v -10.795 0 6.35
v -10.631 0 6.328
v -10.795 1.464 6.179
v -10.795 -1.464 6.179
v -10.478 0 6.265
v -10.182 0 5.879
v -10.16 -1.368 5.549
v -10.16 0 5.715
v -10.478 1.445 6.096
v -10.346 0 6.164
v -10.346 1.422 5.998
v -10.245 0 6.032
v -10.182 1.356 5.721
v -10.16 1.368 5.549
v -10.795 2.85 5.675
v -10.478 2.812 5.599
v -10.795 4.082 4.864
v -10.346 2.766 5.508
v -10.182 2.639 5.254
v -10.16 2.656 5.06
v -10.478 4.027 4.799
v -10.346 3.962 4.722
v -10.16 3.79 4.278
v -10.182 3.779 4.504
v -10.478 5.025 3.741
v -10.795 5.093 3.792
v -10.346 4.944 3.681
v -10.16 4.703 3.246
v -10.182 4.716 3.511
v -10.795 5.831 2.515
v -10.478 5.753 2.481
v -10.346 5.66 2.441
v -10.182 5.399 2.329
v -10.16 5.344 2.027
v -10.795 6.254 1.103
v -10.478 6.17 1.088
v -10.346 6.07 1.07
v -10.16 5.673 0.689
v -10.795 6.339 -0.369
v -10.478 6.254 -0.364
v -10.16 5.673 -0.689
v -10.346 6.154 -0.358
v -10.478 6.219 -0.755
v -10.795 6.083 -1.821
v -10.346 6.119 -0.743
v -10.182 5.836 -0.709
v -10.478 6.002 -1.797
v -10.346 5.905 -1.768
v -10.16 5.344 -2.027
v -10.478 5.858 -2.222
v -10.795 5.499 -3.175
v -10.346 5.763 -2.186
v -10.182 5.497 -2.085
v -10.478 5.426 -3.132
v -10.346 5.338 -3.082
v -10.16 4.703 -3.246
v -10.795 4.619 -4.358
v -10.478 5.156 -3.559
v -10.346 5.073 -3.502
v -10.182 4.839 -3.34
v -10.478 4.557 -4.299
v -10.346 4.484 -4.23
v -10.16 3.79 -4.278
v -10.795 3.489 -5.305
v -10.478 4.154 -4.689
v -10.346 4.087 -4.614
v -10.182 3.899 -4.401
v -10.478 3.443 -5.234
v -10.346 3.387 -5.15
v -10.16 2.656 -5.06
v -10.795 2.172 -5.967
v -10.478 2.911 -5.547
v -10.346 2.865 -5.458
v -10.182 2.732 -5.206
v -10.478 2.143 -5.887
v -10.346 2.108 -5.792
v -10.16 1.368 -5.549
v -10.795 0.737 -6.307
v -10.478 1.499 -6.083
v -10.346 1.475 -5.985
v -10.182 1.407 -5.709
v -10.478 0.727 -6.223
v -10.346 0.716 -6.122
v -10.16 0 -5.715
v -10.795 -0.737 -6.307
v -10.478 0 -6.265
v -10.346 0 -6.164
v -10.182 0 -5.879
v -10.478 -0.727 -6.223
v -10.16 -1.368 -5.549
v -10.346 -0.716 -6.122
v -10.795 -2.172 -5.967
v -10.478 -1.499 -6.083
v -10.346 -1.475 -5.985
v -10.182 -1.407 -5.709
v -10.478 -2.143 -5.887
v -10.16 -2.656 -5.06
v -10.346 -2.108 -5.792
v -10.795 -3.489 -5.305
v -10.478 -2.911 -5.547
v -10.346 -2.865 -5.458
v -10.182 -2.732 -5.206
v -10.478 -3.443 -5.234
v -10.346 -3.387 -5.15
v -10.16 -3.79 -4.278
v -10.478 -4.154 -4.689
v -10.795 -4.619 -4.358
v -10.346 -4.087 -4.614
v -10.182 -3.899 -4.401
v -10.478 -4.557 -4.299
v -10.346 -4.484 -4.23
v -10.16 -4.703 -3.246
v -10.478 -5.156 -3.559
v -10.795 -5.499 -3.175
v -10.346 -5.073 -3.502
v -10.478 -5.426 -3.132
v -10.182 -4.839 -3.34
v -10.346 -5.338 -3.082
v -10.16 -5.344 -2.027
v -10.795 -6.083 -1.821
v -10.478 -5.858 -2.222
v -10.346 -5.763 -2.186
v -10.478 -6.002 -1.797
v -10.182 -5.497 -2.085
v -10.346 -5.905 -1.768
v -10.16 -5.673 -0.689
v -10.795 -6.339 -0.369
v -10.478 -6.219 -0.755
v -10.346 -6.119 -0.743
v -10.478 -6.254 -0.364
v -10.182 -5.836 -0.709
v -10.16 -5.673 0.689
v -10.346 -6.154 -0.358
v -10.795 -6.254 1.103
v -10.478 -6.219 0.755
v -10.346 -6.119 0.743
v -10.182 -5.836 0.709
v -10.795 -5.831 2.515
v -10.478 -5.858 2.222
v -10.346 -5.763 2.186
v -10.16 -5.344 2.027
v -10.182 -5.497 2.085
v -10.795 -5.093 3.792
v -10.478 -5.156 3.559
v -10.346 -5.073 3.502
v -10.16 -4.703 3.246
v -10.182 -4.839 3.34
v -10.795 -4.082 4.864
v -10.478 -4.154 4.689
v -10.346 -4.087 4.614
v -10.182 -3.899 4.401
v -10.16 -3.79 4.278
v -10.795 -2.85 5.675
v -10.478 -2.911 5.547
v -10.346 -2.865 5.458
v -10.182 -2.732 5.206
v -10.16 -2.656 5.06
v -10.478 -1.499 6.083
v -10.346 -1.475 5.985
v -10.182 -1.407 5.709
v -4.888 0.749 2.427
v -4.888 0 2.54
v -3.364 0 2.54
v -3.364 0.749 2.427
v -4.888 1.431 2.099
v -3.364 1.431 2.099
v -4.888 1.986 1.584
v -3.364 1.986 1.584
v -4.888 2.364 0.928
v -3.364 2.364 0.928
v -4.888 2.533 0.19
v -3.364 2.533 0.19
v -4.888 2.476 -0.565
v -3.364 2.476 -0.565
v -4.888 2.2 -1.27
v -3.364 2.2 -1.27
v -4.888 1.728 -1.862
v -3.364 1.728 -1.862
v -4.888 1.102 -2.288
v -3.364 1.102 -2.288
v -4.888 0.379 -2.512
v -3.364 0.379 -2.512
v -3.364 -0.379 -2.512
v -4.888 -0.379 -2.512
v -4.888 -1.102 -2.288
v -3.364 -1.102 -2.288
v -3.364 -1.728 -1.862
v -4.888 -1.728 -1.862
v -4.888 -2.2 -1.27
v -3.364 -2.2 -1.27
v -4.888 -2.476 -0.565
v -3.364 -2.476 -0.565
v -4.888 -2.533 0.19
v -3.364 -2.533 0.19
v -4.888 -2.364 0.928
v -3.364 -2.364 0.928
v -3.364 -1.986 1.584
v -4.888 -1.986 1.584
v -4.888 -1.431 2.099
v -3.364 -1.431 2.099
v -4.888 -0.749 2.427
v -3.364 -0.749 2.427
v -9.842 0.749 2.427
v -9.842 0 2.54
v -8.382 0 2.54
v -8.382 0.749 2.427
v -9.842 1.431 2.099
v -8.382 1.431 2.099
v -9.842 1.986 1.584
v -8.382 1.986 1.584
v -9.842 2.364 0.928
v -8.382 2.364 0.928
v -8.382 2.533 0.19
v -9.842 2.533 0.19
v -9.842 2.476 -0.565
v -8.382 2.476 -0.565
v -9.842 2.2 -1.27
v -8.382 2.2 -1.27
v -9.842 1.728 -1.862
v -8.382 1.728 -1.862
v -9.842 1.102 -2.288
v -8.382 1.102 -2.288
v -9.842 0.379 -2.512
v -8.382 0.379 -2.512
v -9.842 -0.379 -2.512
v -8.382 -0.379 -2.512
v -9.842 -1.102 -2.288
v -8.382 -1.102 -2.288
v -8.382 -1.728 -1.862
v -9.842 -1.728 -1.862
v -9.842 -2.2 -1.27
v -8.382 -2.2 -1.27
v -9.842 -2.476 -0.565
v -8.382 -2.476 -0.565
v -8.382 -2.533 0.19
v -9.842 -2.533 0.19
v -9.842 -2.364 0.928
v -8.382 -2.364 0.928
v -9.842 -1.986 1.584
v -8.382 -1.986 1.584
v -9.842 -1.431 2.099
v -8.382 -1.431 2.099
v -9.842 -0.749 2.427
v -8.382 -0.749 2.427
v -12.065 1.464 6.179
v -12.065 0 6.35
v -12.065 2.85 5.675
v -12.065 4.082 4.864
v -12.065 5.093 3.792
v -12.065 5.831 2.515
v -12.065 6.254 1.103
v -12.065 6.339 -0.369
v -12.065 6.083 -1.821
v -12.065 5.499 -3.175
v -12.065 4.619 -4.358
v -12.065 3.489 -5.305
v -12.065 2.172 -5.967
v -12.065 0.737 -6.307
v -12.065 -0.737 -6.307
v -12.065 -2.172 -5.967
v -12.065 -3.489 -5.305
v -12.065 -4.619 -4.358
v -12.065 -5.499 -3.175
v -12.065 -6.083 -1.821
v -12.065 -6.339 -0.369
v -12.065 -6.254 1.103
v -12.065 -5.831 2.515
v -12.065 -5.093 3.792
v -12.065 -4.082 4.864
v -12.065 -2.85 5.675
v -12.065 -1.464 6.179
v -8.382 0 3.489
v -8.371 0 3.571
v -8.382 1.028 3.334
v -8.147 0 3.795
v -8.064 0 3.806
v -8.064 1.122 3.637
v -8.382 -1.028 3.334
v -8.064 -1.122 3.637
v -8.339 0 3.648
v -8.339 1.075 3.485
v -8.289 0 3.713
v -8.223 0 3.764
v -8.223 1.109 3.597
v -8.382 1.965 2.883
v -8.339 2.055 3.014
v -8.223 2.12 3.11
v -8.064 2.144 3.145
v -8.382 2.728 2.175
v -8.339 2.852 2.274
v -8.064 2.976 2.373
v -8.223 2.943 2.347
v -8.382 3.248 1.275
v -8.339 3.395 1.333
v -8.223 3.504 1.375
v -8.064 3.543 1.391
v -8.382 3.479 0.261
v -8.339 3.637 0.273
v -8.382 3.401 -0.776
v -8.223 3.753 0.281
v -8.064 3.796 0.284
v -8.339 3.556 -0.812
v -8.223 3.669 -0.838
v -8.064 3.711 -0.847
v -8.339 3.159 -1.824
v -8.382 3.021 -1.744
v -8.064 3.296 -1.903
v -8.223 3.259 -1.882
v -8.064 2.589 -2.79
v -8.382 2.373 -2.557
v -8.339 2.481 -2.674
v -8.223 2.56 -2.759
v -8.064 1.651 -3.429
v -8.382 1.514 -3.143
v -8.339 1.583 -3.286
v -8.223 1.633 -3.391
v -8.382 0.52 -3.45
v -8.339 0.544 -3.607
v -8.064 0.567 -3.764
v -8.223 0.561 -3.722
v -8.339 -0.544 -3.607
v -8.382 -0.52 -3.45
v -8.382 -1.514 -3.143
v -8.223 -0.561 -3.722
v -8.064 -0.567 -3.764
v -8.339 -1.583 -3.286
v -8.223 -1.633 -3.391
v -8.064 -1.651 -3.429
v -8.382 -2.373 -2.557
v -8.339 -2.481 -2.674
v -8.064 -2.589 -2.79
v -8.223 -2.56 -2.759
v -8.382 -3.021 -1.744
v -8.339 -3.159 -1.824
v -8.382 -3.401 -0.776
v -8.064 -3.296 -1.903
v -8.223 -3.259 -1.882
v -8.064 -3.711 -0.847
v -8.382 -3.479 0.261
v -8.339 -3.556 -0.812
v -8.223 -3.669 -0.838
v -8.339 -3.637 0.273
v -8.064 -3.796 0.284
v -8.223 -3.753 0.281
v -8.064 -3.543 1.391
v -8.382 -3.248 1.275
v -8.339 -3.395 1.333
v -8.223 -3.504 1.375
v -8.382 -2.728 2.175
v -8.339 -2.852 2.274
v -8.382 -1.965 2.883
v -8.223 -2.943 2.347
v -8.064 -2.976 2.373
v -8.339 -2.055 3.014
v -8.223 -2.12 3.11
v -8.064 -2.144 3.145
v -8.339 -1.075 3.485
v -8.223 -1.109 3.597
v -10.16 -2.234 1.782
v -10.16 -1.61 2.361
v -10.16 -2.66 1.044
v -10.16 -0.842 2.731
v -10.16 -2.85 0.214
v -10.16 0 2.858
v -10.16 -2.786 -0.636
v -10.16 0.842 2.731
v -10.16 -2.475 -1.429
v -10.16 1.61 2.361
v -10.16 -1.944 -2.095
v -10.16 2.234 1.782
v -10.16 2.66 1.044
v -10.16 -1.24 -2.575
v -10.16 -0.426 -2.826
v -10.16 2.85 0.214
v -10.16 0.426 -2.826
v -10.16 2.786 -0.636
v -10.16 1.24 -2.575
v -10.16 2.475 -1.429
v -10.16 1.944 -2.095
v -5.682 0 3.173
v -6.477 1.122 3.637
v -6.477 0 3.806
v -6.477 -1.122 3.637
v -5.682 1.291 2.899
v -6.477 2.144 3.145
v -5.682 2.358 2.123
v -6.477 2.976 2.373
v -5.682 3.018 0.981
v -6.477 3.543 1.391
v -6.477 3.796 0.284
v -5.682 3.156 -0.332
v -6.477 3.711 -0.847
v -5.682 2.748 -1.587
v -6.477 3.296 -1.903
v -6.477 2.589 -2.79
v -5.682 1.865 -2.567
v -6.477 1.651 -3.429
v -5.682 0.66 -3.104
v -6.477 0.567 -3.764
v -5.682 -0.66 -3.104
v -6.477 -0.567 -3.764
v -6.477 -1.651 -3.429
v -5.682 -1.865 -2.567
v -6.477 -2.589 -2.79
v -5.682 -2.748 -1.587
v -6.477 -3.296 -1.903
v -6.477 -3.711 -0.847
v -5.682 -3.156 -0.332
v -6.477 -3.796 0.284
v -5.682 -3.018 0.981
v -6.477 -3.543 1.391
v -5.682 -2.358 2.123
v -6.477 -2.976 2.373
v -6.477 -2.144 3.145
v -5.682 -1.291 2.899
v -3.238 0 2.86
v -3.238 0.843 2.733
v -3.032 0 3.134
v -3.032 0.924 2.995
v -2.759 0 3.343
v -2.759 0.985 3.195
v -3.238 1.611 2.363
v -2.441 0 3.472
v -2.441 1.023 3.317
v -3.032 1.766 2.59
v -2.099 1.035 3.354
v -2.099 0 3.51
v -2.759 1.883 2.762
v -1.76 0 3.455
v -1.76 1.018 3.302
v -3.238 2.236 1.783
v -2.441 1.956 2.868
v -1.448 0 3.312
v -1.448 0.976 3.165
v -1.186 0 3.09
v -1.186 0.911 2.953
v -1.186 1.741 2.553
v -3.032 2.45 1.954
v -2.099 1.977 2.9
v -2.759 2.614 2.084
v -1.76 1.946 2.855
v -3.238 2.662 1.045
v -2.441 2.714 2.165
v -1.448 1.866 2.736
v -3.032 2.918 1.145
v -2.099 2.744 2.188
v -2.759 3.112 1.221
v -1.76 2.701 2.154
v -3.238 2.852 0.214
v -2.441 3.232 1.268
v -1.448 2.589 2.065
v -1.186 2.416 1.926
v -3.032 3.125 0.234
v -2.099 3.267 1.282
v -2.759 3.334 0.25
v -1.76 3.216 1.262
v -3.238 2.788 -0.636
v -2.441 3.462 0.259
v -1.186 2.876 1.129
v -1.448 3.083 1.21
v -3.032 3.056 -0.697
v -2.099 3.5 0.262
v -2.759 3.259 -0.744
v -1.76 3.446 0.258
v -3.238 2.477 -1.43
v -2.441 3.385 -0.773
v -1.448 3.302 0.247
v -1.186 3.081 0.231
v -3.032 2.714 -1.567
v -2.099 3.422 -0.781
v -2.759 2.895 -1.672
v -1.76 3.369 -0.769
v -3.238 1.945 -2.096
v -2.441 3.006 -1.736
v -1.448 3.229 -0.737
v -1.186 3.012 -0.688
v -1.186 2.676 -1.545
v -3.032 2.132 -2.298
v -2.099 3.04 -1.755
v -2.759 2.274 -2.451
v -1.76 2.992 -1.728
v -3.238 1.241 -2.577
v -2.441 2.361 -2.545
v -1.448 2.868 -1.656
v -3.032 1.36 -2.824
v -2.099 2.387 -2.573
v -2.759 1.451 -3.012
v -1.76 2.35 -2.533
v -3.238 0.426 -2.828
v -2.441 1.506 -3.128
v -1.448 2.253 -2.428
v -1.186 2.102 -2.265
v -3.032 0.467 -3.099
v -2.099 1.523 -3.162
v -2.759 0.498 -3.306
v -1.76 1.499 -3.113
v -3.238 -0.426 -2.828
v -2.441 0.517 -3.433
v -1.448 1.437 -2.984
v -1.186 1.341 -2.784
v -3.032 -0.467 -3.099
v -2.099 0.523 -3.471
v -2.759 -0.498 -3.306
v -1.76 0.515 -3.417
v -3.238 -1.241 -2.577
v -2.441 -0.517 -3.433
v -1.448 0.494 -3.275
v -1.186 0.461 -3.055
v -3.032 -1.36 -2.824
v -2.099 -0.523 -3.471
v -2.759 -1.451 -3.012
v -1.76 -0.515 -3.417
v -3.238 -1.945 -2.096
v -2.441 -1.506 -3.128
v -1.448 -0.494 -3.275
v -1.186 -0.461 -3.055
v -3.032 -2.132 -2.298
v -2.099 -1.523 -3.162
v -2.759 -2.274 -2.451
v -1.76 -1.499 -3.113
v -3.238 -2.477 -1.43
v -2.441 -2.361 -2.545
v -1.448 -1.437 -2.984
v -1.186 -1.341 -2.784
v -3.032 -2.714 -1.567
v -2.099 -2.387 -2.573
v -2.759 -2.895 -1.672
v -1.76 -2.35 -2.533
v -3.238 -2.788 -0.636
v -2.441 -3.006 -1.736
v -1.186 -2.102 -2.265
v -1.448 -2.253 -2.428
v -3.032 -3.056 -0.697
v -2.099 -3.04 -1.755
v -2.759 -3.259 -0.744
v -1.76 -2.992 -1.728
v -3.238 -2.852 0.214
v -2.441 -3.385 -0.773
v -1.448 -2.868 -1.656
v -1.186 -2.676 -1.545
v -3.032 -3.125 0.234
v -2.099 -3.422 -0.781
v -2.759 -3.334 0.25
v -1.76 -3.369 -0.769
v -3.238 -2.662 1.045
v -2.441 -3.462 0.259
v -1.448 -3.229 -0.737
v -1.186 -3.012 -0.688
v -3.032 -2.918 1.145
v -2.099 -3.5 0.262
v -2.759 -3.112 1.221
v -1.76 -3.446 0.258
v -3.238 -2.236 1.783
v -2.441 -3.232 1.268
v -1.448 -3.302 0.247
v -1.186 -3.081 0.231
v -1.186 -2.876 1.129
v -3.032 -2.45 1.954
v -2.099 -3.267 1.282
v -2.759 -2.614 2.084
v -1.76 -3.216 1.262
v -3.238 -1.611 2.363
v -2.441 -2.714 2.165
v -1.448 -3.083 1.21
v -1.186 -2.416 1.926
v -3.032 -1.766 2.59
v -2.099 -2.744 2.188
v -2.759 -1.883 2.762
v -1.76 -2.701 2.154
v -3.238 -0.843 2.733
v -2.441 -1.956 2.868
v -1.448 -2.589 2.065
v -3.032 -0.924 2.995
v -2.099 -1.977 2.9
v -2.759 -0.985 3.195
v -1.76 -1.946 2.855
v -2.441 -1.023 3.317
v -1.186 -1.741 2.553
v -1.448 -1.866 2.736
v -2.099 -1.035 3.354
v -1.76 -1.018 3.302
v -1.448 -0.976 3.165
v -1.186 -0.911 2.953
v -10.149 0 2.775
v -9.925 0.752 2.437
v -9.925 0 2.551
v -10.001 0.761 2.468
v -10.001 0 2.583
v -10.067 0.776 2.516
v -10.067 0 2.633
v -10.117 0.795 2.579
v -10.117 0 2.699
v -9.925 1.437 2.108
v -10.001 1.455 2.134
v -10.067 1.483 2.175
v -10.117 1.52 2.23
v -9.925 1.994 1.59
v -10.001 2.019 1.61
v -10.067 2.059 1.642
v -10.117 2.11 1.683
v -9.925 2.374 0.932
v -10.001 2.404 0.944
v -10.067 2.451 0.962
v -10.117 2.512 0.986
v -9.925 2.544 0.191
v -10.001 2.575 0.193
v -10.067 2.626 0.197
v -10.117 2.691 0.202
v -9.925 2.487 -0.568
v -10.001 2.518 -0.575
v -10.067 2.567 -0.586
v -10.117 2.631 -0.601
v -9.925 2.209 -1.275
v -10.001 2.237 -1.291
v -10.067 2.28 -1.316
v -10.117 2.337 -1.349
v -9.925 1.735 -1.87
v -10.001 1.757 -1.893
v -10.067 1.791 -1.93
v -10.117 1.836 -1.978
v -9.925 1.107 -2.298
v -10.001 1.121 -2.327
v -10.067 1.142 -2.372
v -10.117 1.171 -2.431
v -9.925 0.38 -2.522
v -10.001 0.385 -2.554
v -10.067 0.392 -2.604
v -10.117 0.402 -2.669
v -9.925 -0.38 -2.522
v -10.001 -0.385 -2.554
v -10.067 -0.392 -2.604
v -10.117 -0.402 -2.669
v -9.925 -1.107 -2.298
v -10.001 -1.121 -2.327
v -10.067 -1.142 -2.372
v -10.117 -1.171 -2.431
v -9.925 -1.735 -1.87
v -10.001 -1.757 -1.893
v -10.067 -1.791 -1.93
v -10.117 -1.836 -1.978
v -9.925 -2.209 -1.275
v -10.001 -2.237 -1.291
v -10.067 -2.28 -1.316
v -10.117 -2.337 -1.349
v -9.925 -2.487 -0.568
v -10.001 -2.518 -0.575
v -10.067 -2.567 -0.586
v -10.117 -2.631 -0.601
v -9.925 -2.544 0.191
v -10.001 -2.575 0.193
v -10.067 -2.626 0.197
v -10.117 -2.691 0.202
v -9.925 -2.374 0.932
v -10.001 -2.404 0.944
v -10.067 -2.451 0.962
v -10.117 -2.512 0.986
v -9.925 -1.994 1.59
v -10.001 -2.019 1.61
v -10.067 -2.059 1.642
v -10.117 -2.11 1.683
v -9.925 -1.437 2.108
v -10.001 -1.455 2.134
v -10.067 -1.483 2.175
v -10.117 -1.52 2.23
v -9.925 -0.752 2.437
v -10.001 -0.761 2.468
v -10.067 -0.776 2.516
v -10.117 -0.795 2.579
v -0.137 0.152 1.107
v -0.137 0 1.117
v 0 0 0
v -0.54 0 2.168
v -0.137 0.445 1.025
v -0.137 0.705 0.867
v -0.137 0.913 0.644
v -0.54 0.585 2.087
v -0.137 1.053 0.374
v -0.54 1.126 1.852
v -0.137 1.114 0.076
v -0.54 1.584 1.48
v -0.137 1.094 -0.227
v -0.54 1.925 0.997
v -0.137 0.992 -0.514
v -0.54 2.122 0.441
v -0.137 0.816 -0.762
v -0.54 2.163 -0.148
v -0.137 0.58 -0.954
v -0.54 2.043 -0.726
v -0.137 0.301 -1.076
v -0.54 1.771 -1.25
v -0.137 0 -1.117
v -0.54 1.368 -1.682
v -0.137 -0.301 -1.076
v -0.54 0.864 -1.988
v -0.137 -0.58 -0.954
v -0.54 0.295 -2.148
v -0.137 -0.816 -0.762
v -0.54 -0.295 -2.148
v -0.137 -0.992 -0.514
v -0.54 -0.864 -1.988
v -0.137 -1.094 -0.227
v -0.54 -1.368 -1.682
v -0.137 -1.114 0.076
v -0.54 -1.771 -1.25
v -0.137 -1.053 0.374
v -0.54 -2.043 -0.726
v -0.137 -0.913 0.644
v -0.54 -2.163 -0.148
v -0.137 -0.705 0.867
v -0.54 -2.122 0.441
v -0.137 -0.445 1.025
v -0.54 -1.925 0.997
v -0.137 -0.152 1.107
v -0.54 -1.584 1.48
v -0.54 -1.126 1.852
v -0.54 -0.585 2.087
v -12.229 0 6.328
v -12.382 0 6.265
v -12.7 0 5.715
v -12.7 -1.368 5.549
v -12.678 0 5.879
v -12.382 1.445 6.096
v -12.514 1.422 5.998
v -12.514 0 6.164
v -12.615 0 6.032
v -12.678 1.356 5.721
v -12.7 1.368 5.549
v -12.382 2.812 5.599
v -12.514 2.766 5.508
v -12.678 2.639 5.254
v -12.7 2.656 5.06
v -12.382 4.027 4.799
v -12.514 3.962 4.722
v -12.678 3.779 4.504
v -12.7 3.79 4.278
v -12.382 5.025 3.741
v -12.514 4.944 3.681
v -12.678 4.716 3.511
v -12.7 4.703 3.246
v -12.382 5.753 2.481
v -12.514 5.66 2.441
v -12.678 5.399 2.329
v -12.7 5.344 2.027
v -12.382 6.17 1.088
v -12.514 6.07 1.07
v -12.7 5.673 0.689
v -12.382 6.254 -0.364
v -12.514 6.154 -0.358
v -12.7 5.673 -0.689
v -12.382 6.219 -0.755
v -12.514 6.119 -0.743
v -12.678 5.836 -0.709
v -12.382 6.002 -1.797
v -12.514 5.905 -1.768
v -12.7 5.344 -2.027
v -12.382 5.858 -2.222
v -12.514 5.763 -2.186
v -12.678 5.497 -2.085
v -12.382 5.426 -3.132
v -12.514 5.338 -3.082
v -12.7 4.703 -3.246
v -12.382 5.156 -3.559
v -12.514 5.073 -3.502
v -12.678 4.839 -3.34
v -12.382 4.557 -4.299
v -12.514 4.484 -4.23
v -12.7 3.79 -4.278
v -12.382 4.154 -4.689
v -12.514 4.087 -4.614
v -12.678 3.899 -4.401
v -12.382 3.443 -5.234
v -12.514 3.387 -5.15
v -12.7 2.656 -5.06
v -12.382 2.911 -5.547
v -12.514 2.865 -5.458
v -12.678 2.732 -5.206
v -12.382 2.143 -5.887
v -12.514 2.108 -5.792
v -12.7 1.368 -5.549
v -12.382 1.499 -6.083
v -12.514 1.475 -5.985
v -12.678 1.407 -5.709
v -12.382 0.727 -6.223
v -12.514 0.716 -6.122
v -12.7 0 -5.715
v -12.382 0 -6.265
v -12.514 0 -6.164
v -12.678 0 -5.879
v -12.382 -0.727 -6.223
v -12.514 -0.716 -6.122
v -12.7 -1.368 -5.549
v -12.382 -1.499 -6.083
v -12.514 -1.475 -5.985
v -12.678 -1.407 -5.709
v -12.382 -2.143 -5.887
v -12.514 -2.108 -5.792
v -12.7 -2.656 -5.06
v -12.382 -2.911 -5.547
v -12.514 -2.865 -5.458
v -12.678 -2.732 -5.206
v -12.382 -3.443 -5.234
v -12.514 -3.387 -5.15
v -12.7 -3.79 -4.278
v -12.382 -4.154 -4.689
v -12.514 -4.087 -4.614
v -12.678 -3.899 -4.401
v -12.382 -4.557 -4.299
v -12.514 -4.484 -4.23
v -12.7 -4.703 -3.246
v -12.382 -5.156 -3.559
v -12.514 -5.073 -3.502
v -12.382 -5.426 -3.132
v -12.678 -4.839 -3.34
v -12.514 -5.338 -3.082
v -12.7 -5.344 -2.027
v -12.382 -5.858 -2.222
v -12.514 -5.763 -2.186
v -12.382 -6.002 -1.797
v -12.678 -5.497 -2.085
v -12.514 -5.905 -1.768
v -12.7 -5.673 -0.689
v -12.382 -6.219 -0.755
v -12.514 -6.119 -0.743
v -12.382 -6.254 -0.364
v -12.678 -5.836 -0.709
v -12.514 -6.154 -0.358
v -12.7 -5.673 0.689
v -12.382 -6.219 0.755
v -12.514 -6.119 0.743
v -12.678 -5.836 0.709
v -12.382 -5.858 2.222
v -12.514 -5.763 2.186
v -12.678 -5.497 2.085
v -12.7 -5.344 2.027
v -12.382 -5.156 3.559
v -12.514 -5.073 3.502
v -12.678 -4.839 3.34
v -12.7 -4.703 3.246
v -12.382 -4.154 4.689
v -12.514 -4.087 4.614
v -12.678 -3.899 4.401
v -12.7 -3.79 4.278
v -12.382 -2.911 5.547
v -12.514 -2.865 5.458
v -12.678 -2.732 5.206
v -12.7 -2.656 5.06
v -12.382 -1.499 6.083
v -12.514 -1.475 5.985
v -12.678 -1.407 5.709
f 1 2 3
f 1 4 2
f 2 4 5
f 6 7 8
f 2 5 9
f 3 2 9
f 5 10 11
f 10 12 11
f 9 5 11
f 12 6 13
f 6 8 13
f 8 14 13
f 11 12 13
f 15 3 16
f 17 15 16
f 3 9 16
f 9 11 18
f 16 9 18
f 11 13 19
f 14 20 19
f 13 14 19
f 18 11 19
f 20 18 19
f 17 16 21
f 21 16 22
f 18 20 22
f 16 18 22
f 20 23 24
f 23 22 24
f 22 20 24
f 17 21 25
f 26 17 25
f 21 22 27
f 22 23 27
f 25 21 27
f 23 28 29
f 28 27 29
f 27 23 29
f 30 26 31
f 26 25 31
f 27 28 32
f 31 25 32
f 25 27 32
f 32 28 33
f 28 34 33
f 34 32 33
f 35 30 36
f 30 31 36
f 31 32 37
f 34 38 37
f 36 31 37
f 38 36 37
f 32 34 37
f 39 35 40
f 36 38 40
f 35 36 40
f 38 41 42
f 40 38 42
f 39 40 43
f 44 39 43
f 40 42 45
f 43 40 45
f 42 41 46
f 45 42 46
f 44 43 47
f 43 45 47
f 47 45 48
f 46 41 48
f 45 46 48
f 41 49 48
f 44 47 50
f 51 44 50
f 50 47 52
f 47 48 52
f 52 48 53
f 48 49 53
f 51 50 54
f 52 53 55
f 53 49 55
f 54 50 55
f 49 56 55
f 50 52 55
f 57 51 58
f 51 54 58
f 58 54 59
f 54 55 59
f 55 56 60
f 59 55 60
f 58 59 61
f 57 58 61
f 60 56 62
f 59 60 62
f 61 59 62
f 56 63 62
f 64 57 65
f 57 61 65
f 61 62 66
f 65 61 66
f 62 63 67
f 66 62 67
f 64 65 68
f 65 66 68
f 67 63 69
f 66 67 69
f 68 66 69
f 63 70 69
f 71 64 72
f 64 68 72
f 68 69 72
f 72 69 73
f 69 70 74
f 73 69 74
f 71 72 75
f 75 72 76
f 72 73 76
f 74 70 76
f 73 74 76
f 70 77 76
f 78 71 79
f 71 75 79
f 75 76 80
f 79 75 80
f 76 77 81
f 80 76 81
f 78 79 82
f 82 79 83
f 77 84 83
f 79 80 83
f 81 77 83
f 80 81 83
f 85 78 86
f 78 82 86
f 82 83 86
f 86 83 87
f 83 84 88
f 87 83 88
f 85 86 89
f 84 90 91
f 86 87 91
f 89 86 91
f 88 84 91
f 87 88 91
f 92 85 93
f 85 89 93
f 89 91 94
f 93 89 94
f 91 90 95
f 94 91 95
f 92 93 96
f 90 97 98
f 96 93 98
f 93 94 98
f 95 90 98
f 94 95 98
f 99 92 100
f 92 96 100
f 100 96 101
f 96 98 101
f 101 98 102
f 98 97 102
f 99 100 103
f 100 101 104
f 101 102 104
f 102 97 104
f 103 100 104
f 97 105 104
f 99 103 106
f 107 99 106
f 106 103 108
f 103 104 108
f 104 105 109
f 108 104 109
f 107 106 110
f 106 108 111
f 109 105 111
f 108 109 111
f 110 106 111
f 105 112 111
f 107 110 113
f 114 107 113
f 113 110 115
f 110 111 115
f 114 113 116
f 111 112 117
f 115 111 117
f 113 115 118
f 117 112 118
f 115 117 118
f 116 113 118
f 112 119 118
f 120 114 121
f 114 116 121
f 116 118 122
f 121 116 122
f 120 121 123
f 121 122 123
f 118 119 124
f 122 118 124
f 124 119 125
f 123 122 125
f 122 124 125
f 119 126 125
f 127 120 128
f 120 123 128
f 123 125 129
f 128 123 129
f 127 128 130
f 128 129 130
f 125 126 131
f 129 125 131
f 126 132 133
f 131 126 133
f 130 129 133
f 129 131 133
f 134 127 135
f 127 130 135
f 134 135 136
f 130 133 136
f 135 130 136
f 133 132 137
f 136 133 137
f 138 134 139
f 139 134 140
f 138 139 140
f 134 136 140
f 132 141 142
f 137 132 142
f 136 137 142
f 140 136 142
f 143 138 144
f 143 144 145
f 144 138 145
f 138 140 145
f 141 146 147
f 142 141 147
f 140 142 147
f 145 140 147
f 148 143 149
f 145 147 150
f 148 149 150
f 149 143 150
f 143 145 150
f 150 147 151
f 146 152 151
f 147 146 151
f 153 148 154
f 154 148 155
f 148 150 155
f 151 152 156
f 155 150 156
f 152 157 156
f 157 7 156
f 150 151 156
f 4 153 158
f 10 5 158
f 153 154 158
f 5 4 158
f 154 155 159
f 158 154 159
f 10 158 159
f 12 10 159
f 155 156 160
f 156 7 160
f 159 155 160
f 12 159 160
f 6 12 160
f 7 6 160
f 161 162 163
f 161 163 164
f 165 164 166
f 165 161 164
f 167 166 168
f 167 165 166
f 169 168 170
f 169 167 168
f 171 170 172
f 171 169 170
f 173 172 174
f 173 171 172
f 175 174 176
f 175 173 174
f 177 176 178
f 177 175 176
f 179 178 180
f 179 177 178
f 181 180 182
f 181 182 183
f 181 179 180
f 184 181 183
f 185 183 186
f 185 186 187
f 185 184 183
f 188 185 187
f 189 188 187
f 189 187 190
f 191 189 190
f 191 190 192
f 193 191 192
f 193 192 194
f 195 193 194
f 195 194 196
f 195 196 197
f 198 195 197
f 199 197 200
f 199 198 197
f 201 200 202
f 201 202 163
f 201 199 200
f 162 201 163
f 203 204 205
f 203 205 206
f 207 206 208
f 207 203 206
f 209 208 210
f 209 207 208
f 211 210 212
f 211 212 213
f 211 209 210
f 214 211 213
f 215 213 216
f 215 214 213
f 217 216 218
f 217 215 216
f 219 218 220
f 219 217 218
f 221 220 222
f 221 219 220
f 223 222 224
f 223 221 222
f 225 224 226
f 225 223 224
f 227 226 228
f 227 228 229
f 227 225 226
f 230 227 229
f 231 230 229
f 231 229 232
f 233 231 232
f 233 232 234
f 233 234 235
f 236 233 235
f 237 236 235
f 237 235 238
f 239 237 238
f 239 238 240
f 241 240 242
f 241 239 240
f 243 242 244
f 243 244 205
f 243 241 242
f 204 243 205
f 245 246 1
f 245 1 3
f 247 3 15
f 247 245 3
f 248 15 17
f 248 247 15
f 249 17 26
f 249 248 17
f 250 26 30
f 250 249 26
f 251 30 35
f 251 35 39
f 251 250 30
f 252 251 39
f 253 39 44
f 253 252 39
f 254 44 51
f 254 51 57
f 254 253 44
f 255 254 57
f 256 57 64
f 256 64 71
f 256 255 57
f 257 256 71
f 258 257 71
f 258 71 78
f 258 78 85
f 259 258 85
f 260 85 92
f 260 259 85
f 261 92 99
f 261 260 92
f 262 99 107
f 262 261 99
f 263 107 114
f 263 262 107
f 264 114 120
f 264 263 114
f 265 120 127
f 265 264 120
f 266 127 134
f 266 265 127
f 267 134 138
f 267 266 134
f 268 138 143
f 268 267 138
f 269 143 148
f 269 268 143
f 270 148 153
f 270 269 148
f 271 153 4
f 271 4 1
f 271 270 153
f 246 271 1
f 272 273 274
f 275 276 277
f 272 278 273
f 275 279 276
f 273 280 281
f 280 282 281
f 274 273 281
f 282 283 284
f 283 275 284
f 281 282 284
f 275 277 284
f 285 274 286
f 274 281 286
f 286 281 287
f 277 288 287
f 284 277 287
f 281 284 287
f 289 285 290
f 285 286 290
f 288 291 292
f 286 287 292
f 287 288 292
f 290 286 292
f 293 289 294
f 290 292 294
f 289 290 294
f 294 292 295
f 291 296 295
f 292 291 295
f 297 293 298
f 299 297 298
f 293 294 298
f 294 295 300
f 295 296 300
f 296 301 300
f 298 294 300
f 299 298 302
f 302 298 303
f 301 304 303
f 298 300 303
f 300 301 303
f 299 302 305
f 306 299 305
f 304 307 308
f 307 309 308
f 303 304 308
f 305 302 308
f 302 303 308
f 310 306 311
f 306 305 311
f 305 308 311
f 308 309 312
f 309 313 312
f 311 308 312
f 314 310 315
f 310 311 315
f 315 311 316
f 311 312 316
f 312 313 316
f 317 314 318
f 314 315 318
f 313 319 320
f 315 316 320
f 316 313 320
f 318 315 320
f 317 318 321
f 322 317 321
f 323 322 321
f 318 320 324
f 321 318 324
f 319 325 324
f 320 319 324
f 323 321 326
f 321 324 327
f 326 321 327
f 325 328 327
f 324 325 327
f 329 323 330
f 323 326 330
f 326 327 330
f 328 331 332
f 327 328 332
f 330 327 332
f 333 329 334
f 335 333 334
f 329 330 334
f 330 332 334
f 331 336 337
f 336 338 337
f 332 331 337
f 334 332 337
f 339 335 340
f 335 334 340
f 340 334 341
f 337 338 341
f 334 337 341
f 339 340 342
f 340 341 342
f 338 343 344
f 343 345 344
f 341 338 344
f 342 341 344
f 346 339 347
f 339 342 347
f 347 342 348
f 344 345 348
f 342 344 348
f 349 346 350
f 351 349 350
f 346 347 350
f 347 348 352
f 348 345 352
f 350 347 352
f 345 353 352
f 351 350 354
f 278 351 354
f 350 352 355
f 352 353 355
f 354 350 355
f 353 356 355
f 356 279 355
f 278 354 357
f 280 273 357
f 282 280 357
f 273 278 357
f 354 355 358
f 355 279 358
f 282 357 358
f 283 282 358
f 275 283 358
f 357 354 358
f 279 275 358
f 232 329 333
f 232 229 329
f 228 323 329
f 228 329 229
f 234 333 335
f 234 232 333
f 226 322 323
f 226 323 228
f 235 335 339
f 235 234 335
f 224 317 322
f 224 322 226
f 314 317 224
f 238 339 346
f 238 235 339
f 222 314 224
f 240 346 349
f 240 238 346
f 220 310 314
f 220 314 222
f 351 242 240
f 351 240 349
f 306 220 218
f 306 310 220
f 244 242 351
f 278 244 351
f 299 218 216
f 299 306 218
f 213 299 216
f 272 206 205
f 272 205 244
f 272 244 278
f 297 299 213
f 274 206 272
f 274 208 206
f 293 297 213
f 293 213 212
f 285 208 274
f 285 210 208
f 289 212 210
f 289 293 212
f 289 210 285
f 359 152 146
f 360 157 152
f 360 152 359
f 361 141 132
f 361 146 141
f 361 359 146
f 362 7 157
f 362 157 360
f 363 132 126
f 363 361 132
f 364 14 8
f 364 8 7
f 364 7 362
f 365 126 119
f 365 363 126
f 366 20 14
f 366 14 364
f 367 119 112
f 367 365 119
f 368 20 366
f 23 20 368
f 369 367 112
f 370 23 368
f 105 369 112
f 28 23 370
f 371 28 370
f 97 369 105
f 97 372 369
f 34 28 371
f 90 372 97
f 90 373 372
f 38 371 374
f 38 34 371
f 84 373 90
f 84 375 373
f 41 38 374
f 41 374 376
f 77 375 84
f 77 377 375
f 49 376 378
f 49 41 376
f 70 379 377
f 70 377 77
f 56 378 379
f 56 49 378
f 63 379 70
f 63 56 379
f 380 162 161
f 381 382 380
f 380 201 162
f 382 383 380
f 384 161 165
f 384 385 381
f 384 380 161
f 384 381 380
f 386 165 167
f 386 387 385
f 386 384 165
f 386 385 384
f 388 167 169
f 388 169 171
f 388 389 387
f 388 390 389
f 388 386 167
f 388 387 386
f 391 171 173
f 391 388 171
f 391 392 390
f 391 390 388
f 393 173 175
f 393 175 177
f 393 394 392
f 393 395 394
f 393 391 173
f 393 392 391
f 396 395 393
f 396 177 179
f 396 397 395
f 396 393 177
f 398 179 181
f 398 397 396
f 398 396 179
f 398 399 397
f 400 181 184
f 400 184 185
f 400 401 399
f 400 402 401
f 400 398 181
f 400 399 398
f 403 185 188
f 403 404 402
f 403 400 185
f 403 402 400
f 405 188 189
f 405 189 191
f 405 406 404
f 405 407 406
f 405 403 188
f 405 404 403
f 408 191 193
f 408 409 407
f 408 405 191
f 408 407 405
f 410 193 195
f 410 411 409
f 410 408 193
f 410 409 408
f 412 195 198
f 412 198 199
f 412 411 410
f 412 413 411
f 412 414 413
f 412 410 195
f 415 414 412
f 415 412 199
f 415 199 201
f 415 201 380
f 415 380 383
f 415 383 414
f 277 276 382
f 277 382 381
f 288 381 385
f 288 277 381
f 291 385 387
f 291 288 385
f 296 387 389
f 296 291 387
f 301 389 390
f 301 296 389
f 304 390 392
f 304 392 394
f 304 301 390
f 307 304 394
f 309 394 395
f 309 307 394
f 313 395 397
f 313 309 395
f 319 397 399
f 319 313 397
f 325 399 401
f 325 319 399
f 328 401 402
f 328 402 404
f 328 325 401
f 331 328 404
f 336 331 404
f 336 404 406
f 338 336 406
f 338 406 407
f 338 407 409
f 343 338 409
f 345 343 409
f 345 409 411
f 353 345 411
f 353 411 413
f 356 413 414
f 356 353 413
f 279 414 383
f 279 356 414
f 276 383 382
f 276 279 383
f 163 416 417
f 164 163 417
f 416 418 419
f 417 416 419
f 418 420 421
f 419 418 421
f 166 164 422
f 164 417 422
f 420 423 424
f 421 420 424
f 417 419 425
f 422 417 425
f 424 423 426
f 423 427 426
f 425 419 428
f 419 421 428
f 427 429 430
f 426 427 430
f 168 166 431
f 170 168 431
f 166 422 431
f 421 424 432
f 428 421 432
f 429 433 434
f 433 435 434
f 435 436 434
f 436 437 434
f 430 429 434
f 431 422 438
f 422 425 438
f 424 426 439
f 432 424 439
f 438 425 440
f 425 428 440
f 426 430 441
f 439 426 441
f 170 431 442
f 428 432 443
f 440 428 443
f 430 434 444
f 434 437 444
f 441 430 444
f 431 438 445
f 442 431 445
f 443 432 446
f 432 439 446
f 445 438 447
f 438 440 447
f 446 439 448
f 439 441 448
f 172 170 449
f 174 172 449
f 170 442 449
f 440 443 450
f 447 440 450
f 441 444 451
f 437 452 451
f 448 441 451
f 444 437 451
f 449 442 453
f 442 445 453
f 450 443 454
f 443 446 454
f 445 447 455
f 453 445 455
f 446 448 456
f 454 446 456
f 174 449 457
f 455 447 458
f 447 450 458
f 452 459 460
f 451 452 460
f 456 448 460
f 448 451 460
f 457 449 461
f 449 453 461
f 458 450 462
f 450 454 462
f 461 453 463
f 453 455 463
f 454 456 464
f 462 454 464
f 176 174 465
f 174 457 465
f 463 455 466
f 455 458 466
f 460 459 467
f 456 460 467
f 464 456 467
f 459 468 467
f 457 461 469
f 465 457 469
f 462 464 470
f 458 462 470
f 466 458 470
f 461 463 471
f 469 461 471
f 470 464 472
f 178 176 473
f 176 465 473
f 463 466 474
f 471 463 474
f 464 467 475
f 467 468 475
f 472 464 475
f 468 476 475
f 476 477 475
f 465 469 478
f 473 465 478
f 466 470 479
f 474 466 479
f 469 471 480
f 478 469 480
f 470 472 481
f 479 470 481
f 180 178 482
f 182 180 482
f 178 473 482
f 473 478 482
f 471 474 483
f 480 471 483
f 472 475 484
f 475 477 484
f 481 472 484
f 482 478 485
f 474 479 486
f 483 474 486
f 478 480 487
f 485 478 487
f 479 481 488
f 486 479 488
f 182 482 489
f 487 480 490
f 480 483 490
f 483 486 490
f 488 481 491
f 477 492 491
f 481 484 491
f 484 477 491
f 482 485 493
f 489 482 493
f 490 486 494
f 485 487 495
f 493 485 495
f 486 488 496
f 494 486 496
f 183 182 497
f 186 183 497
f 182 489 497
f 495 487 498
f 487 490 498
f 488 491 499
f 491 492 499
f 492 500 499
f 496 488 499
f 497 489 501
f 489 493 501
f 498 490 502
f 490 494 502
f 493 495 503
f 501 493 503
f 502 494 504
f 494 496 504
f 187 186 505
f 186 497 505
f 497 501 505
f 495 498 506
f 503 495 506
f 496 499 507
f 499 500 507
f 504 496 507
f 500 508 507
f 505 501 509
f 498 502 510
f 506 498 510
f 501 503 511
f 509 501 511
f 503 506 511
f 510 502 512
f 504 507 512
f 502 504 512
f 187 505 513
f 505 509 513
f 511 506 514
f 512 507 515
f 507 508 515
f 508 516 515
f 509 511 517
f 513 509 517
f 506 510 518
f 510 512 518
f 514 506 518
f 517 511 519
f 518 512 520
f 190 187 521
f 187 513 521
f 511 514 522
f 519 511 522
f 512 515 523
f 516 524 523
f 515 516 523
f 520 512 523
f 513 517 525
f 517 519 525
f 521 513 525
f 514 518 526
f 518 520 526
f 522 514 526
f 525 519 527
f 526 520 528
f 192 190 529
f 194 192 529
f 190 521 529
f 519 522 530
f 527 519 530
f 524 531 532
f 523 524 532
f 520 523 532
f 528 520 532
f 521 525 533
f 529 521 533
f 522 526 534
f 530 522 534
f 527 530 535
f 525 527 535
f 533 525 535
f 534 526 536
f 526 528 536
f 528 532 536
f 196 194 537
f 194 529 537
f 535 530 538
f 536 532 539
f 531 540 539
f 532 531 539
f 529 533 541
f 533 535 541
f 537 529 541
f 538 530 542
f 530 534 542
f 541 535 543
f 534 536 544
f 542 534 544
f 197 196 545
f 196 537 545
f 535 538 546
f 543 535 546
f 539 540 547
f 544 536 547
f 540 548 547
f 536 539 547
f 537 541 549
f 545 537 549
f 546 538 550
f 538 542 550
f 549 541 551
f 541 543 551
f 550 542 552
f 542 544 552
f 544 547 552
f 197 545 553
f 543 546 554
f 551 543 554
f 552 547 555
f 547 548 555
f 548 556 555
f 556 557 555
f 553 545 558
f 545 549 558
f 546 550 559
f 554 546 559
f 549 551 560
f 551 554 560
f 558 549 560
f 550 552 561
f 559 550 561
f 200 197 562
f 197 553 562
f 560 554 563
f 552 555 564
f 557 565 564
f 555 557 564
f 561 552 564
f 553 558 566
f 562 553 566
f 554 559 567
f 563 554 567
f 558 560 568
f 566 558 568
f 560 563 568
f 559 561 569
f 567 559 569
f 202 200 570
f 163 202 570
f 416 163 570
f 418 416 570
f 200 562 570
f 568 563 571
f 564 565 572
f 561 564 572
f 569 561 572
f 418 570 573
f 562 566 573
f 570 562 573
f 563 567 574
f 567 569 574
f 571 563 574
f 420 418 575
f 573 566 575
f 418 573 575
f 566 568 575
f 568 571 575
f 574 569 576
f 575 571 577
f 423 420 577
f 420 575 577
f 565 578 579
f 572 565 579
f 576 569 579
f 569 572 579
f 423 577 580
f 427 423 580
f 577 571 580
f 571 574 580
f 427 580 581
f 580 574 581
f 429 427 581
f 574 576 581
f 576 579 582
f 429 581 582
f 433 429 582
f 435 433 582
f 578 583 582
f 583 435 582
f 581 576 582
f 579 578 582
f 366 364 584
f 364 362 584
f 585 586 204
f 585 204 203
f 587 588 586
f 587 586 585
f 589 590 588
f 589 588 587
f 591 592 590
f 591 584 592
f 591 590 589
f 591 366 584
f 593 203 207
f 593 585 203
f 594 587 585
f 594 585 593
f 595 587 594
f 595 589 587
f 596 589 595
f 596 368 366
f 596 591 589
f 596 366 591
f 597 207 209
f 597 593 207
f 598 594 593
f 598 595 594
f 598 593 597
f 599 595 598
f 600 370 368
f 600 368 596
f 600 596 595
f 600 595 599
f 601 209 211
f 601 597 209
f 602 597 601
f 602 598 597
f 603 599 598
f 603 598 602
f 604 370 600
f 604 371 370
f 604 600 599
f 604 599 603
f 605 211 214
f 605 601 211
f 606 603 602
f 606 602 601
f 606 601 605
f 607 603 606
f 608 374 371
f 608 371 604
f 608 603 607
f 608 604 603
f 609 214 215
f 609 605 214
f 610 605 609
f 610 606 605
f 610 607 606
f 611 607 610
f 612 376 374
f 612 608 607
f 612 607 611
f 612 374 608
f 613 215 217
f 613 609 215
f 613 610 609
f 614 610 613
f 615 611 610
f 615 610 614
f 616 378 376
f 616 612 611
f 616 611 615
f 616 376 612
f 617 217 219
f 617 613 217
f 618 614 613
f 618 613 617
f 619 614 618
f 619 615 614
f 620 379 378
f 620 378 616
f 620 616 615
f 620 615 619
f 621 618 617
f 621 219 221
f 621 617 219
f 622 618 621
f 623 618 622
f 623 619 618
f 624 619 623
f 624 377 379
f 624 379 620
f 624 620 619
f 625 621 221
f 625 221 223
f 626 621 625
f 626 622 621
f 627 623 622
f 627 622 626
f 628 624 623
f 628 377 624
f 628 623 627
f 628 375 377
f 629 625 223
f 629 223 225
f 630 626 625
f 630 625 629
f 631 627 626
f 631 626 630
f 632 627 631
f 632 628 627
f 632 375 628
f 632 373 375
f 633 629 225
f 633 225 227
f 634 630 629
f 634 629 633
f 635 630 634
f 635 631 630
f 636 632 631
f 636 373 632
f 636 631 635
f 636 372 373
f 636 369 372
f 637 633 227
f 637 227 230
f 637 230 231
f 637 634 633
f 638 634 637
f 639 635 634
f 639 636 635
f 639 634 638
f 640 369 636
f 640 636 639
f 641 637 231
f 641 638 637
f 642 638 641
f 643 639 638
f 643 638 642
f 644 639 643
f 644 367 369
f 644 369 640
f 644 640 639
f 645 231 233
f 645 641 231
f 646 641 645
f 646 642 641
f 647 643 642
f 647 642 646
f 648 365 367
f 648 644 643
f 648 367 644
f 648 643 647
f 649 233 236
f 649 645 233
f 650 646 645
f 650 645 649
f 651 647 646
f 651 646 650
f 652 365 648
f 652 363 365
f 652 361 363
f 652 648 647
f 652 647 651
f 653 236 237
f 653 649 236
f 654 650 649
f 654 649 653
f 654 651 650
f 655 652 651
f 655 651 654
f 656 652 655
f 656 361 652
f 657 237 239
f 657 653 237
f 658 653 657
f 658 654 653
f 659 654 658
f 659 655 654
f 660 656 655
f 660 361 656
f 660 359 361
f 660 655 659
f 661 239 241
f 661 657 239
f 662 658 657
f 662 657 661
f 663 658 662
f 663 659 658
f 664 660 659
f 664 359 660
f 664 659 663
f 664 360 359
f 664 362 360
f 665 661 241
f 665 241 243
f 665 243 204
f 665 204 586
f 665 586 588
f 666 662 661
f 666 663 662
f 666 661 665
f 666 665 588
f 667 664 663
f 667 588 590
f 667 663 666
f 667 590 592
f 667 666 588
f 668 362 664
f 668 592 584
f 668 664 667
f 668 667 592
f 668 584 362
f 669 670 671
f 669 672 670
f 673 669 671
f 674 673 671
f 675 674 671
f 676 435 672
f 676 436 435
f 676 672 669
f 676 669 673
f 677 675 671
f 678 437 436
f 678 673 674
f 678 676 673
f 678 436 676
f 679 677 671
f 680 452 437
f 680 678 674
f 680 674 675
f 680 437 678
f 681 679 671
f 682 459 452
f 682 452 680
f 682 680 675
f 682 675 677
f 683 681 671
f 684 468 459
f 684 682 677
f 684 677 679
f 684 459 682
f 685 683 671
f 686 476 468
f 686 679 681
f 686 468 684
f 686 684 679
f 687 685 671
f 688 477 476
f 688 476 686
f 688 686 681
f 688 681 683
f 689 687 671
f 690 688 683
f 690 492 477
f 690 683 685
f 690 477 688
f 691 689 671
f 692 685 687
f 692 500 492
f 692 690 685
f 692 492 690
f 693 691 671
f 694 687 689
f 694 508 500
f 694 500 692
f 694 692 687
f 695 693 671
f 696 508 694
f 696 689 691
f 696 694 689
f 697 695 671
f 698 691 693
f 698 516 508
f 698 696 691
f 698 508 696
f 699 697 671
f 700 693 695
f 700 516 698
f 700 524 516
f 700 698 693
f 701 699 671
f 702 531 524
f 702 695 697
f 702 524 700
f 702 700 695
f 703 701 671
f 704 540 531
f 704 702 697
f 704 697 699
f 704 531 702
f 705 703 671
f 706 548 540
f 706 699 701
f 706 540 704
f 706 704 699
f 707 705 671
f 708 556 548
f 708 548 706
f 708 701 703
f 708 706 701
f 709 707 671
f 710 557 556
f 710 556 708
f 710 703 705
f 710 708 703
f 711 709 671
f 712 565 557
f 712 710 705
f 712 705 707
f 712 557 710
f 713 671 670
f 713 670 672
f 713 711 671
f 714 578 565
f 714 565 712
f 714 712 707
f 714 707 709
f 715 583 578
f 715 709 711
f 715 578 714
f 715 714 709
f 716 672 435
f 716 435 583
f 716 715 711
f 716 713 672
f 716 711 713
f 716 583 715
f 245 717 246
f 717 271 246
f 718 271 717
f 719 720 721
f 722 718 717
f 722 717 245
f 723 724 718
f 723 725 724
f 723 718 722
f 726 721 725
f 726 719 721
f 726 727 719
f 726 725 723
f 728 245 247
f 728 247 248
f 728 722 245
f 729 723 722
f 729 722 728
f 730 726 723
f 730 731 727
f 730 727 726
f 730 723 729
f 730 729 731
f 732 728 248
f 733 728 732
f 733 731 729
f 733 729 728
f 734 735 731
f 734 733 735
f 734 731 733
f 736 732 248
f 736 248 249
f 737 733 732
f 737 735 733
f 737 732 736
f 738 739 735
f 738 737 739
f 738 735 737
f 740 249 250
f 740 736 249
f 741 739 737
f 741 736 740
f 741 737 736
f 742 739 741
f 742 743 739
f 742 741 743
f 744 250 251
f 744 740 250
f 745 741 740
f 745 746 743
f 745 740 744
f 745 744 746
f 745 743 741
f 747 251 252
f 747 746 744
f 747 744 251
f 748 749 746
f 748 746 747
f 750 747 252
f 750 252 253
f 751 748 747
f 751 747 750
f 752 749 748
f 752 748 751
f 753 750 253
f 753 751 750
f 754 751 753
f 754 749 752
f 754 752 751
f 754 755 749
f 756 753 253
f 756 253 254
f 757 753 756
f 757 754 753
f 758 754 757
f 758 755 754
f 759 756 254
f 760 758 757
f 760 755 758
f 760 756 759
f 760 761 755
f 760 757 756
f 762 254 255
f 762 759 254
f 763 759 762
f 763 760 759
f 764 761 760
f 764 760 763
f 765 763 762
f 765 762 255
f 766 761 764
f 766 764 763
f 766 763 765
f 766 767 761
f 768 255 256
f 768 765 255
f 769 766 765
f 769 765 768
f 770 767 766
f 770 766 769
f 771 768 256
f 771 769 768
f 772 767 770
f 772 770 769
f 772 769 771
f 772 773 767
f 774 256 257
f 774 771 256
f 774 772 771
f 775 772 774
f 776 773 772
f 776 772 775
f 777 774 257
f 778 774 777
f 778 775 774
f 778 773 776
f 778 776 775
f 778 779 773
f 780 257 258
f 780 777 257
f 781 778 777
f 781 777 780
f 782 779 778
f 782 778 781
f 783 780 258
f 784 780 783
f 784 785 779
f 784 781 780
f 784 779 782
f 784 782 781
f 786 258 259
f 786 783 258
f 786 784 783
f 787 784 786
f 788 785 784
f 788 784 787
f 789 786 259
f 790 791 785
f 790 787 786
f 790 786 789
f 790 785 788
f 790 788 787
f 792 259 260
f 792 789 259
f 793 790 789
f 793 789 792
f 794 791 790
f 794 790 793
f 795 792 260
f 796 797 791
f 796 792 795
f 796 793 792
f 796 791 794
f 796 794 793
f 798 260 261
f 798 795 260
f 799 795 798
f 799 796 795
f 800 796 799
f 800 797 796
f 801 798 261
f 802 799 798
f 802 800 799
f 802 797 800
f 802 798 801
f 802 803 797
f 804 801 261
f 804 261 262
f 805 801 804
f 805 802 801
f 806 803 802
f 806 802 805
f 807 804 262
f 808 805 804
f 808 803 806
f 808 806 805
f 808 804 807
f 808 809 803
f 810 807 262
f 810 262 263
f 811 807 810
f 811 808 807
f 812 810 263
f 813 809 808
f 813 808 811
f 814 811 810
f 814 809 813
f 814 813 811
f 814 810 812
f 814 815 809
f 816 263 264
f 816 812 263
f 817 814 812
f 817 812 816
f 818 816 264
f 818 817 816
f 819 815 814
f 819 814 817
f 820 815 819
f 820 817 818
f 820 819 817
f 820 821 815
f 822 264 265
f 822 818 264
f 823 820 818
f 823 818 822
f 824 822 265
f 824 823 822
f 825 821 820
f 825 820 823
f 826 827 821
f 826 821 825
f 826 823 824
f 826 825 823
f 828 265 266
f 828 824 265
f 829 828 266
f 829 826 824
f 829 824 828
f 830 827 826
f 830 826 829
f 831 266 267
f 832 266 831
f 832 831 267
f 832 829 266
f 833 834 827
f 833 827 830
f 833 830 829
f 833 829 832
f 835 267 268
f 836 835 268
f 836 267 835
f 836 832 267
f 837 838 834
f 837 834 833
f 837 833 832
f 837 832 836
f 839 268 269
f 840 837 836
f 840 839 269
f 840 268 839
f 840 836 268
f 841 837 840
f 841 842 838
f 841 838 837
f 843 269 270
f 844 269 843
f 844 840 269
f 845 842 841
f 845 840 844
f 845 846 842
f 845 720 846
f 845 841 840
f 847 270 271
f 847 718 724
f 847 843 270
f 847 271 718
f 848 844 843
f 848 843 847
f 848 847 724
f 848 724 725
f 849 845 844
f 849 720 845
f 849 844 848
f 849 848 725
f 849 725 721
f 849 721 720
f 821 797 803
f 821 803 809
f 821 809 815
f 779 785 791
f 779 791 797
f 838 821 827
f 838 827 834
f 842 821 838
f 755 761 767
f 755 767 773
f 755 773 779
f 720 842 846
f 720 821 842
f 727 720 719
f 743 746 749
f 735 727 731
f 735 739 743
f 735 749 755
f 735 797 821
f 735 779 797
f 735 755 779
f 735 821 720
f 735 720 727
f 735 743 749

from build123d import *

# Parameters (mm, degrees)
F2_R = 0.635
F3_R = 0.635
F4_R = 0.3175
F5_R = 0.3175


# Not quite as in the source:
# - a fillet or chamfer that OpenCascade refuses, or shapes differently, is made with other operations: its cross-section is extruded or revolved along the edge and cut away or added


with BuildPart() as f1:
    # F0 (on Front) → F1 (revolve)
    with BuildSketch(Plane.XZ):
        with BuildLine():
            Line((-12.7, 0), (0, 0))
            ThreePointArc((0, 0), (-0.9357326302, 2.7871609809), (-3.3637836337, 4.445))
            Line((-3.3637836337, 4.445), (-3.3637836337, 2.54))
            Line((-3.3637836337, 2.54), (-4.8877836337, 2.54))
            Line((-4.8877836337, 2.54), (-6.477, 3.8062603766))
            Line((-6.477, 3.8062603766), (-8.382, 3.8062603766))
            Line((-8.382, 3.8062603766), (-8.382, 2.54))
            Line((-8.382, 2.54), (-10.16, 2.54))
            Line((-10.16, 2.54), (-10.16, 6.35))
            Line((-10.16, 6.35), (-12.7, 6.35))
            Line((-12.7, 6.35), (-12.7, 0))
        make_face()
    revolve(axis=Axis((-6.35, 0, 0), (-1, 0, 0)))

    # F2
    f2_edges = [f1.edges().sort_by_distance(p)[0] for p in [
        (-12.7, 0, -6.35),
    ]]
    fillet(f2_edges, radius=F2_R)

    # F3
    f3_edges = [f1.edges().sort_by_distance(p)[0] for p in [
        (-10.16, 0, -6.35),
    ]]
    fillet(f3_edges, radius=F3_R)

    # F4
    f4_edges = [f1.edges().sort_by_distance(p)[0] for p in [
        (-8.382, 0, -3.80626),
    ]]
    fillet(f4_edges, radius=F4_R)

    # F5
    f5_edges = [f1.edges().sort_by_distance(p)[0] for p in [
        (-10.16, 0, -2.54),
    ]]
    fillet(f5_edges, radius=F5_R)

    # F6: fillet of radius 1.27 on 2 edges, made by hand

    # F6_s1 → F6_t2 (revolve, cut)
    with BuildSketch(Plane.XZ):
        with BuildLine():
            ThreePointArc((-3.3637836337, 2.54), (-2.4405099474, 3.4716029629), (-1.1856937405, 3.0898246668))
            ThreePointArc((-1.1856937405, 3.0898246668), (-2.1787682731, 3.9216596724), (-3.3637836337, 4.445))
            Line((-3.3637836337, 4.445), (-3.3637836337, 2.54))
        make_face()
    revolve(axis=Axis((-3.3637836337, 0, 0), (-1, 0, 0)), mode=Mode.SUBTRACT)


solid = f1.part
